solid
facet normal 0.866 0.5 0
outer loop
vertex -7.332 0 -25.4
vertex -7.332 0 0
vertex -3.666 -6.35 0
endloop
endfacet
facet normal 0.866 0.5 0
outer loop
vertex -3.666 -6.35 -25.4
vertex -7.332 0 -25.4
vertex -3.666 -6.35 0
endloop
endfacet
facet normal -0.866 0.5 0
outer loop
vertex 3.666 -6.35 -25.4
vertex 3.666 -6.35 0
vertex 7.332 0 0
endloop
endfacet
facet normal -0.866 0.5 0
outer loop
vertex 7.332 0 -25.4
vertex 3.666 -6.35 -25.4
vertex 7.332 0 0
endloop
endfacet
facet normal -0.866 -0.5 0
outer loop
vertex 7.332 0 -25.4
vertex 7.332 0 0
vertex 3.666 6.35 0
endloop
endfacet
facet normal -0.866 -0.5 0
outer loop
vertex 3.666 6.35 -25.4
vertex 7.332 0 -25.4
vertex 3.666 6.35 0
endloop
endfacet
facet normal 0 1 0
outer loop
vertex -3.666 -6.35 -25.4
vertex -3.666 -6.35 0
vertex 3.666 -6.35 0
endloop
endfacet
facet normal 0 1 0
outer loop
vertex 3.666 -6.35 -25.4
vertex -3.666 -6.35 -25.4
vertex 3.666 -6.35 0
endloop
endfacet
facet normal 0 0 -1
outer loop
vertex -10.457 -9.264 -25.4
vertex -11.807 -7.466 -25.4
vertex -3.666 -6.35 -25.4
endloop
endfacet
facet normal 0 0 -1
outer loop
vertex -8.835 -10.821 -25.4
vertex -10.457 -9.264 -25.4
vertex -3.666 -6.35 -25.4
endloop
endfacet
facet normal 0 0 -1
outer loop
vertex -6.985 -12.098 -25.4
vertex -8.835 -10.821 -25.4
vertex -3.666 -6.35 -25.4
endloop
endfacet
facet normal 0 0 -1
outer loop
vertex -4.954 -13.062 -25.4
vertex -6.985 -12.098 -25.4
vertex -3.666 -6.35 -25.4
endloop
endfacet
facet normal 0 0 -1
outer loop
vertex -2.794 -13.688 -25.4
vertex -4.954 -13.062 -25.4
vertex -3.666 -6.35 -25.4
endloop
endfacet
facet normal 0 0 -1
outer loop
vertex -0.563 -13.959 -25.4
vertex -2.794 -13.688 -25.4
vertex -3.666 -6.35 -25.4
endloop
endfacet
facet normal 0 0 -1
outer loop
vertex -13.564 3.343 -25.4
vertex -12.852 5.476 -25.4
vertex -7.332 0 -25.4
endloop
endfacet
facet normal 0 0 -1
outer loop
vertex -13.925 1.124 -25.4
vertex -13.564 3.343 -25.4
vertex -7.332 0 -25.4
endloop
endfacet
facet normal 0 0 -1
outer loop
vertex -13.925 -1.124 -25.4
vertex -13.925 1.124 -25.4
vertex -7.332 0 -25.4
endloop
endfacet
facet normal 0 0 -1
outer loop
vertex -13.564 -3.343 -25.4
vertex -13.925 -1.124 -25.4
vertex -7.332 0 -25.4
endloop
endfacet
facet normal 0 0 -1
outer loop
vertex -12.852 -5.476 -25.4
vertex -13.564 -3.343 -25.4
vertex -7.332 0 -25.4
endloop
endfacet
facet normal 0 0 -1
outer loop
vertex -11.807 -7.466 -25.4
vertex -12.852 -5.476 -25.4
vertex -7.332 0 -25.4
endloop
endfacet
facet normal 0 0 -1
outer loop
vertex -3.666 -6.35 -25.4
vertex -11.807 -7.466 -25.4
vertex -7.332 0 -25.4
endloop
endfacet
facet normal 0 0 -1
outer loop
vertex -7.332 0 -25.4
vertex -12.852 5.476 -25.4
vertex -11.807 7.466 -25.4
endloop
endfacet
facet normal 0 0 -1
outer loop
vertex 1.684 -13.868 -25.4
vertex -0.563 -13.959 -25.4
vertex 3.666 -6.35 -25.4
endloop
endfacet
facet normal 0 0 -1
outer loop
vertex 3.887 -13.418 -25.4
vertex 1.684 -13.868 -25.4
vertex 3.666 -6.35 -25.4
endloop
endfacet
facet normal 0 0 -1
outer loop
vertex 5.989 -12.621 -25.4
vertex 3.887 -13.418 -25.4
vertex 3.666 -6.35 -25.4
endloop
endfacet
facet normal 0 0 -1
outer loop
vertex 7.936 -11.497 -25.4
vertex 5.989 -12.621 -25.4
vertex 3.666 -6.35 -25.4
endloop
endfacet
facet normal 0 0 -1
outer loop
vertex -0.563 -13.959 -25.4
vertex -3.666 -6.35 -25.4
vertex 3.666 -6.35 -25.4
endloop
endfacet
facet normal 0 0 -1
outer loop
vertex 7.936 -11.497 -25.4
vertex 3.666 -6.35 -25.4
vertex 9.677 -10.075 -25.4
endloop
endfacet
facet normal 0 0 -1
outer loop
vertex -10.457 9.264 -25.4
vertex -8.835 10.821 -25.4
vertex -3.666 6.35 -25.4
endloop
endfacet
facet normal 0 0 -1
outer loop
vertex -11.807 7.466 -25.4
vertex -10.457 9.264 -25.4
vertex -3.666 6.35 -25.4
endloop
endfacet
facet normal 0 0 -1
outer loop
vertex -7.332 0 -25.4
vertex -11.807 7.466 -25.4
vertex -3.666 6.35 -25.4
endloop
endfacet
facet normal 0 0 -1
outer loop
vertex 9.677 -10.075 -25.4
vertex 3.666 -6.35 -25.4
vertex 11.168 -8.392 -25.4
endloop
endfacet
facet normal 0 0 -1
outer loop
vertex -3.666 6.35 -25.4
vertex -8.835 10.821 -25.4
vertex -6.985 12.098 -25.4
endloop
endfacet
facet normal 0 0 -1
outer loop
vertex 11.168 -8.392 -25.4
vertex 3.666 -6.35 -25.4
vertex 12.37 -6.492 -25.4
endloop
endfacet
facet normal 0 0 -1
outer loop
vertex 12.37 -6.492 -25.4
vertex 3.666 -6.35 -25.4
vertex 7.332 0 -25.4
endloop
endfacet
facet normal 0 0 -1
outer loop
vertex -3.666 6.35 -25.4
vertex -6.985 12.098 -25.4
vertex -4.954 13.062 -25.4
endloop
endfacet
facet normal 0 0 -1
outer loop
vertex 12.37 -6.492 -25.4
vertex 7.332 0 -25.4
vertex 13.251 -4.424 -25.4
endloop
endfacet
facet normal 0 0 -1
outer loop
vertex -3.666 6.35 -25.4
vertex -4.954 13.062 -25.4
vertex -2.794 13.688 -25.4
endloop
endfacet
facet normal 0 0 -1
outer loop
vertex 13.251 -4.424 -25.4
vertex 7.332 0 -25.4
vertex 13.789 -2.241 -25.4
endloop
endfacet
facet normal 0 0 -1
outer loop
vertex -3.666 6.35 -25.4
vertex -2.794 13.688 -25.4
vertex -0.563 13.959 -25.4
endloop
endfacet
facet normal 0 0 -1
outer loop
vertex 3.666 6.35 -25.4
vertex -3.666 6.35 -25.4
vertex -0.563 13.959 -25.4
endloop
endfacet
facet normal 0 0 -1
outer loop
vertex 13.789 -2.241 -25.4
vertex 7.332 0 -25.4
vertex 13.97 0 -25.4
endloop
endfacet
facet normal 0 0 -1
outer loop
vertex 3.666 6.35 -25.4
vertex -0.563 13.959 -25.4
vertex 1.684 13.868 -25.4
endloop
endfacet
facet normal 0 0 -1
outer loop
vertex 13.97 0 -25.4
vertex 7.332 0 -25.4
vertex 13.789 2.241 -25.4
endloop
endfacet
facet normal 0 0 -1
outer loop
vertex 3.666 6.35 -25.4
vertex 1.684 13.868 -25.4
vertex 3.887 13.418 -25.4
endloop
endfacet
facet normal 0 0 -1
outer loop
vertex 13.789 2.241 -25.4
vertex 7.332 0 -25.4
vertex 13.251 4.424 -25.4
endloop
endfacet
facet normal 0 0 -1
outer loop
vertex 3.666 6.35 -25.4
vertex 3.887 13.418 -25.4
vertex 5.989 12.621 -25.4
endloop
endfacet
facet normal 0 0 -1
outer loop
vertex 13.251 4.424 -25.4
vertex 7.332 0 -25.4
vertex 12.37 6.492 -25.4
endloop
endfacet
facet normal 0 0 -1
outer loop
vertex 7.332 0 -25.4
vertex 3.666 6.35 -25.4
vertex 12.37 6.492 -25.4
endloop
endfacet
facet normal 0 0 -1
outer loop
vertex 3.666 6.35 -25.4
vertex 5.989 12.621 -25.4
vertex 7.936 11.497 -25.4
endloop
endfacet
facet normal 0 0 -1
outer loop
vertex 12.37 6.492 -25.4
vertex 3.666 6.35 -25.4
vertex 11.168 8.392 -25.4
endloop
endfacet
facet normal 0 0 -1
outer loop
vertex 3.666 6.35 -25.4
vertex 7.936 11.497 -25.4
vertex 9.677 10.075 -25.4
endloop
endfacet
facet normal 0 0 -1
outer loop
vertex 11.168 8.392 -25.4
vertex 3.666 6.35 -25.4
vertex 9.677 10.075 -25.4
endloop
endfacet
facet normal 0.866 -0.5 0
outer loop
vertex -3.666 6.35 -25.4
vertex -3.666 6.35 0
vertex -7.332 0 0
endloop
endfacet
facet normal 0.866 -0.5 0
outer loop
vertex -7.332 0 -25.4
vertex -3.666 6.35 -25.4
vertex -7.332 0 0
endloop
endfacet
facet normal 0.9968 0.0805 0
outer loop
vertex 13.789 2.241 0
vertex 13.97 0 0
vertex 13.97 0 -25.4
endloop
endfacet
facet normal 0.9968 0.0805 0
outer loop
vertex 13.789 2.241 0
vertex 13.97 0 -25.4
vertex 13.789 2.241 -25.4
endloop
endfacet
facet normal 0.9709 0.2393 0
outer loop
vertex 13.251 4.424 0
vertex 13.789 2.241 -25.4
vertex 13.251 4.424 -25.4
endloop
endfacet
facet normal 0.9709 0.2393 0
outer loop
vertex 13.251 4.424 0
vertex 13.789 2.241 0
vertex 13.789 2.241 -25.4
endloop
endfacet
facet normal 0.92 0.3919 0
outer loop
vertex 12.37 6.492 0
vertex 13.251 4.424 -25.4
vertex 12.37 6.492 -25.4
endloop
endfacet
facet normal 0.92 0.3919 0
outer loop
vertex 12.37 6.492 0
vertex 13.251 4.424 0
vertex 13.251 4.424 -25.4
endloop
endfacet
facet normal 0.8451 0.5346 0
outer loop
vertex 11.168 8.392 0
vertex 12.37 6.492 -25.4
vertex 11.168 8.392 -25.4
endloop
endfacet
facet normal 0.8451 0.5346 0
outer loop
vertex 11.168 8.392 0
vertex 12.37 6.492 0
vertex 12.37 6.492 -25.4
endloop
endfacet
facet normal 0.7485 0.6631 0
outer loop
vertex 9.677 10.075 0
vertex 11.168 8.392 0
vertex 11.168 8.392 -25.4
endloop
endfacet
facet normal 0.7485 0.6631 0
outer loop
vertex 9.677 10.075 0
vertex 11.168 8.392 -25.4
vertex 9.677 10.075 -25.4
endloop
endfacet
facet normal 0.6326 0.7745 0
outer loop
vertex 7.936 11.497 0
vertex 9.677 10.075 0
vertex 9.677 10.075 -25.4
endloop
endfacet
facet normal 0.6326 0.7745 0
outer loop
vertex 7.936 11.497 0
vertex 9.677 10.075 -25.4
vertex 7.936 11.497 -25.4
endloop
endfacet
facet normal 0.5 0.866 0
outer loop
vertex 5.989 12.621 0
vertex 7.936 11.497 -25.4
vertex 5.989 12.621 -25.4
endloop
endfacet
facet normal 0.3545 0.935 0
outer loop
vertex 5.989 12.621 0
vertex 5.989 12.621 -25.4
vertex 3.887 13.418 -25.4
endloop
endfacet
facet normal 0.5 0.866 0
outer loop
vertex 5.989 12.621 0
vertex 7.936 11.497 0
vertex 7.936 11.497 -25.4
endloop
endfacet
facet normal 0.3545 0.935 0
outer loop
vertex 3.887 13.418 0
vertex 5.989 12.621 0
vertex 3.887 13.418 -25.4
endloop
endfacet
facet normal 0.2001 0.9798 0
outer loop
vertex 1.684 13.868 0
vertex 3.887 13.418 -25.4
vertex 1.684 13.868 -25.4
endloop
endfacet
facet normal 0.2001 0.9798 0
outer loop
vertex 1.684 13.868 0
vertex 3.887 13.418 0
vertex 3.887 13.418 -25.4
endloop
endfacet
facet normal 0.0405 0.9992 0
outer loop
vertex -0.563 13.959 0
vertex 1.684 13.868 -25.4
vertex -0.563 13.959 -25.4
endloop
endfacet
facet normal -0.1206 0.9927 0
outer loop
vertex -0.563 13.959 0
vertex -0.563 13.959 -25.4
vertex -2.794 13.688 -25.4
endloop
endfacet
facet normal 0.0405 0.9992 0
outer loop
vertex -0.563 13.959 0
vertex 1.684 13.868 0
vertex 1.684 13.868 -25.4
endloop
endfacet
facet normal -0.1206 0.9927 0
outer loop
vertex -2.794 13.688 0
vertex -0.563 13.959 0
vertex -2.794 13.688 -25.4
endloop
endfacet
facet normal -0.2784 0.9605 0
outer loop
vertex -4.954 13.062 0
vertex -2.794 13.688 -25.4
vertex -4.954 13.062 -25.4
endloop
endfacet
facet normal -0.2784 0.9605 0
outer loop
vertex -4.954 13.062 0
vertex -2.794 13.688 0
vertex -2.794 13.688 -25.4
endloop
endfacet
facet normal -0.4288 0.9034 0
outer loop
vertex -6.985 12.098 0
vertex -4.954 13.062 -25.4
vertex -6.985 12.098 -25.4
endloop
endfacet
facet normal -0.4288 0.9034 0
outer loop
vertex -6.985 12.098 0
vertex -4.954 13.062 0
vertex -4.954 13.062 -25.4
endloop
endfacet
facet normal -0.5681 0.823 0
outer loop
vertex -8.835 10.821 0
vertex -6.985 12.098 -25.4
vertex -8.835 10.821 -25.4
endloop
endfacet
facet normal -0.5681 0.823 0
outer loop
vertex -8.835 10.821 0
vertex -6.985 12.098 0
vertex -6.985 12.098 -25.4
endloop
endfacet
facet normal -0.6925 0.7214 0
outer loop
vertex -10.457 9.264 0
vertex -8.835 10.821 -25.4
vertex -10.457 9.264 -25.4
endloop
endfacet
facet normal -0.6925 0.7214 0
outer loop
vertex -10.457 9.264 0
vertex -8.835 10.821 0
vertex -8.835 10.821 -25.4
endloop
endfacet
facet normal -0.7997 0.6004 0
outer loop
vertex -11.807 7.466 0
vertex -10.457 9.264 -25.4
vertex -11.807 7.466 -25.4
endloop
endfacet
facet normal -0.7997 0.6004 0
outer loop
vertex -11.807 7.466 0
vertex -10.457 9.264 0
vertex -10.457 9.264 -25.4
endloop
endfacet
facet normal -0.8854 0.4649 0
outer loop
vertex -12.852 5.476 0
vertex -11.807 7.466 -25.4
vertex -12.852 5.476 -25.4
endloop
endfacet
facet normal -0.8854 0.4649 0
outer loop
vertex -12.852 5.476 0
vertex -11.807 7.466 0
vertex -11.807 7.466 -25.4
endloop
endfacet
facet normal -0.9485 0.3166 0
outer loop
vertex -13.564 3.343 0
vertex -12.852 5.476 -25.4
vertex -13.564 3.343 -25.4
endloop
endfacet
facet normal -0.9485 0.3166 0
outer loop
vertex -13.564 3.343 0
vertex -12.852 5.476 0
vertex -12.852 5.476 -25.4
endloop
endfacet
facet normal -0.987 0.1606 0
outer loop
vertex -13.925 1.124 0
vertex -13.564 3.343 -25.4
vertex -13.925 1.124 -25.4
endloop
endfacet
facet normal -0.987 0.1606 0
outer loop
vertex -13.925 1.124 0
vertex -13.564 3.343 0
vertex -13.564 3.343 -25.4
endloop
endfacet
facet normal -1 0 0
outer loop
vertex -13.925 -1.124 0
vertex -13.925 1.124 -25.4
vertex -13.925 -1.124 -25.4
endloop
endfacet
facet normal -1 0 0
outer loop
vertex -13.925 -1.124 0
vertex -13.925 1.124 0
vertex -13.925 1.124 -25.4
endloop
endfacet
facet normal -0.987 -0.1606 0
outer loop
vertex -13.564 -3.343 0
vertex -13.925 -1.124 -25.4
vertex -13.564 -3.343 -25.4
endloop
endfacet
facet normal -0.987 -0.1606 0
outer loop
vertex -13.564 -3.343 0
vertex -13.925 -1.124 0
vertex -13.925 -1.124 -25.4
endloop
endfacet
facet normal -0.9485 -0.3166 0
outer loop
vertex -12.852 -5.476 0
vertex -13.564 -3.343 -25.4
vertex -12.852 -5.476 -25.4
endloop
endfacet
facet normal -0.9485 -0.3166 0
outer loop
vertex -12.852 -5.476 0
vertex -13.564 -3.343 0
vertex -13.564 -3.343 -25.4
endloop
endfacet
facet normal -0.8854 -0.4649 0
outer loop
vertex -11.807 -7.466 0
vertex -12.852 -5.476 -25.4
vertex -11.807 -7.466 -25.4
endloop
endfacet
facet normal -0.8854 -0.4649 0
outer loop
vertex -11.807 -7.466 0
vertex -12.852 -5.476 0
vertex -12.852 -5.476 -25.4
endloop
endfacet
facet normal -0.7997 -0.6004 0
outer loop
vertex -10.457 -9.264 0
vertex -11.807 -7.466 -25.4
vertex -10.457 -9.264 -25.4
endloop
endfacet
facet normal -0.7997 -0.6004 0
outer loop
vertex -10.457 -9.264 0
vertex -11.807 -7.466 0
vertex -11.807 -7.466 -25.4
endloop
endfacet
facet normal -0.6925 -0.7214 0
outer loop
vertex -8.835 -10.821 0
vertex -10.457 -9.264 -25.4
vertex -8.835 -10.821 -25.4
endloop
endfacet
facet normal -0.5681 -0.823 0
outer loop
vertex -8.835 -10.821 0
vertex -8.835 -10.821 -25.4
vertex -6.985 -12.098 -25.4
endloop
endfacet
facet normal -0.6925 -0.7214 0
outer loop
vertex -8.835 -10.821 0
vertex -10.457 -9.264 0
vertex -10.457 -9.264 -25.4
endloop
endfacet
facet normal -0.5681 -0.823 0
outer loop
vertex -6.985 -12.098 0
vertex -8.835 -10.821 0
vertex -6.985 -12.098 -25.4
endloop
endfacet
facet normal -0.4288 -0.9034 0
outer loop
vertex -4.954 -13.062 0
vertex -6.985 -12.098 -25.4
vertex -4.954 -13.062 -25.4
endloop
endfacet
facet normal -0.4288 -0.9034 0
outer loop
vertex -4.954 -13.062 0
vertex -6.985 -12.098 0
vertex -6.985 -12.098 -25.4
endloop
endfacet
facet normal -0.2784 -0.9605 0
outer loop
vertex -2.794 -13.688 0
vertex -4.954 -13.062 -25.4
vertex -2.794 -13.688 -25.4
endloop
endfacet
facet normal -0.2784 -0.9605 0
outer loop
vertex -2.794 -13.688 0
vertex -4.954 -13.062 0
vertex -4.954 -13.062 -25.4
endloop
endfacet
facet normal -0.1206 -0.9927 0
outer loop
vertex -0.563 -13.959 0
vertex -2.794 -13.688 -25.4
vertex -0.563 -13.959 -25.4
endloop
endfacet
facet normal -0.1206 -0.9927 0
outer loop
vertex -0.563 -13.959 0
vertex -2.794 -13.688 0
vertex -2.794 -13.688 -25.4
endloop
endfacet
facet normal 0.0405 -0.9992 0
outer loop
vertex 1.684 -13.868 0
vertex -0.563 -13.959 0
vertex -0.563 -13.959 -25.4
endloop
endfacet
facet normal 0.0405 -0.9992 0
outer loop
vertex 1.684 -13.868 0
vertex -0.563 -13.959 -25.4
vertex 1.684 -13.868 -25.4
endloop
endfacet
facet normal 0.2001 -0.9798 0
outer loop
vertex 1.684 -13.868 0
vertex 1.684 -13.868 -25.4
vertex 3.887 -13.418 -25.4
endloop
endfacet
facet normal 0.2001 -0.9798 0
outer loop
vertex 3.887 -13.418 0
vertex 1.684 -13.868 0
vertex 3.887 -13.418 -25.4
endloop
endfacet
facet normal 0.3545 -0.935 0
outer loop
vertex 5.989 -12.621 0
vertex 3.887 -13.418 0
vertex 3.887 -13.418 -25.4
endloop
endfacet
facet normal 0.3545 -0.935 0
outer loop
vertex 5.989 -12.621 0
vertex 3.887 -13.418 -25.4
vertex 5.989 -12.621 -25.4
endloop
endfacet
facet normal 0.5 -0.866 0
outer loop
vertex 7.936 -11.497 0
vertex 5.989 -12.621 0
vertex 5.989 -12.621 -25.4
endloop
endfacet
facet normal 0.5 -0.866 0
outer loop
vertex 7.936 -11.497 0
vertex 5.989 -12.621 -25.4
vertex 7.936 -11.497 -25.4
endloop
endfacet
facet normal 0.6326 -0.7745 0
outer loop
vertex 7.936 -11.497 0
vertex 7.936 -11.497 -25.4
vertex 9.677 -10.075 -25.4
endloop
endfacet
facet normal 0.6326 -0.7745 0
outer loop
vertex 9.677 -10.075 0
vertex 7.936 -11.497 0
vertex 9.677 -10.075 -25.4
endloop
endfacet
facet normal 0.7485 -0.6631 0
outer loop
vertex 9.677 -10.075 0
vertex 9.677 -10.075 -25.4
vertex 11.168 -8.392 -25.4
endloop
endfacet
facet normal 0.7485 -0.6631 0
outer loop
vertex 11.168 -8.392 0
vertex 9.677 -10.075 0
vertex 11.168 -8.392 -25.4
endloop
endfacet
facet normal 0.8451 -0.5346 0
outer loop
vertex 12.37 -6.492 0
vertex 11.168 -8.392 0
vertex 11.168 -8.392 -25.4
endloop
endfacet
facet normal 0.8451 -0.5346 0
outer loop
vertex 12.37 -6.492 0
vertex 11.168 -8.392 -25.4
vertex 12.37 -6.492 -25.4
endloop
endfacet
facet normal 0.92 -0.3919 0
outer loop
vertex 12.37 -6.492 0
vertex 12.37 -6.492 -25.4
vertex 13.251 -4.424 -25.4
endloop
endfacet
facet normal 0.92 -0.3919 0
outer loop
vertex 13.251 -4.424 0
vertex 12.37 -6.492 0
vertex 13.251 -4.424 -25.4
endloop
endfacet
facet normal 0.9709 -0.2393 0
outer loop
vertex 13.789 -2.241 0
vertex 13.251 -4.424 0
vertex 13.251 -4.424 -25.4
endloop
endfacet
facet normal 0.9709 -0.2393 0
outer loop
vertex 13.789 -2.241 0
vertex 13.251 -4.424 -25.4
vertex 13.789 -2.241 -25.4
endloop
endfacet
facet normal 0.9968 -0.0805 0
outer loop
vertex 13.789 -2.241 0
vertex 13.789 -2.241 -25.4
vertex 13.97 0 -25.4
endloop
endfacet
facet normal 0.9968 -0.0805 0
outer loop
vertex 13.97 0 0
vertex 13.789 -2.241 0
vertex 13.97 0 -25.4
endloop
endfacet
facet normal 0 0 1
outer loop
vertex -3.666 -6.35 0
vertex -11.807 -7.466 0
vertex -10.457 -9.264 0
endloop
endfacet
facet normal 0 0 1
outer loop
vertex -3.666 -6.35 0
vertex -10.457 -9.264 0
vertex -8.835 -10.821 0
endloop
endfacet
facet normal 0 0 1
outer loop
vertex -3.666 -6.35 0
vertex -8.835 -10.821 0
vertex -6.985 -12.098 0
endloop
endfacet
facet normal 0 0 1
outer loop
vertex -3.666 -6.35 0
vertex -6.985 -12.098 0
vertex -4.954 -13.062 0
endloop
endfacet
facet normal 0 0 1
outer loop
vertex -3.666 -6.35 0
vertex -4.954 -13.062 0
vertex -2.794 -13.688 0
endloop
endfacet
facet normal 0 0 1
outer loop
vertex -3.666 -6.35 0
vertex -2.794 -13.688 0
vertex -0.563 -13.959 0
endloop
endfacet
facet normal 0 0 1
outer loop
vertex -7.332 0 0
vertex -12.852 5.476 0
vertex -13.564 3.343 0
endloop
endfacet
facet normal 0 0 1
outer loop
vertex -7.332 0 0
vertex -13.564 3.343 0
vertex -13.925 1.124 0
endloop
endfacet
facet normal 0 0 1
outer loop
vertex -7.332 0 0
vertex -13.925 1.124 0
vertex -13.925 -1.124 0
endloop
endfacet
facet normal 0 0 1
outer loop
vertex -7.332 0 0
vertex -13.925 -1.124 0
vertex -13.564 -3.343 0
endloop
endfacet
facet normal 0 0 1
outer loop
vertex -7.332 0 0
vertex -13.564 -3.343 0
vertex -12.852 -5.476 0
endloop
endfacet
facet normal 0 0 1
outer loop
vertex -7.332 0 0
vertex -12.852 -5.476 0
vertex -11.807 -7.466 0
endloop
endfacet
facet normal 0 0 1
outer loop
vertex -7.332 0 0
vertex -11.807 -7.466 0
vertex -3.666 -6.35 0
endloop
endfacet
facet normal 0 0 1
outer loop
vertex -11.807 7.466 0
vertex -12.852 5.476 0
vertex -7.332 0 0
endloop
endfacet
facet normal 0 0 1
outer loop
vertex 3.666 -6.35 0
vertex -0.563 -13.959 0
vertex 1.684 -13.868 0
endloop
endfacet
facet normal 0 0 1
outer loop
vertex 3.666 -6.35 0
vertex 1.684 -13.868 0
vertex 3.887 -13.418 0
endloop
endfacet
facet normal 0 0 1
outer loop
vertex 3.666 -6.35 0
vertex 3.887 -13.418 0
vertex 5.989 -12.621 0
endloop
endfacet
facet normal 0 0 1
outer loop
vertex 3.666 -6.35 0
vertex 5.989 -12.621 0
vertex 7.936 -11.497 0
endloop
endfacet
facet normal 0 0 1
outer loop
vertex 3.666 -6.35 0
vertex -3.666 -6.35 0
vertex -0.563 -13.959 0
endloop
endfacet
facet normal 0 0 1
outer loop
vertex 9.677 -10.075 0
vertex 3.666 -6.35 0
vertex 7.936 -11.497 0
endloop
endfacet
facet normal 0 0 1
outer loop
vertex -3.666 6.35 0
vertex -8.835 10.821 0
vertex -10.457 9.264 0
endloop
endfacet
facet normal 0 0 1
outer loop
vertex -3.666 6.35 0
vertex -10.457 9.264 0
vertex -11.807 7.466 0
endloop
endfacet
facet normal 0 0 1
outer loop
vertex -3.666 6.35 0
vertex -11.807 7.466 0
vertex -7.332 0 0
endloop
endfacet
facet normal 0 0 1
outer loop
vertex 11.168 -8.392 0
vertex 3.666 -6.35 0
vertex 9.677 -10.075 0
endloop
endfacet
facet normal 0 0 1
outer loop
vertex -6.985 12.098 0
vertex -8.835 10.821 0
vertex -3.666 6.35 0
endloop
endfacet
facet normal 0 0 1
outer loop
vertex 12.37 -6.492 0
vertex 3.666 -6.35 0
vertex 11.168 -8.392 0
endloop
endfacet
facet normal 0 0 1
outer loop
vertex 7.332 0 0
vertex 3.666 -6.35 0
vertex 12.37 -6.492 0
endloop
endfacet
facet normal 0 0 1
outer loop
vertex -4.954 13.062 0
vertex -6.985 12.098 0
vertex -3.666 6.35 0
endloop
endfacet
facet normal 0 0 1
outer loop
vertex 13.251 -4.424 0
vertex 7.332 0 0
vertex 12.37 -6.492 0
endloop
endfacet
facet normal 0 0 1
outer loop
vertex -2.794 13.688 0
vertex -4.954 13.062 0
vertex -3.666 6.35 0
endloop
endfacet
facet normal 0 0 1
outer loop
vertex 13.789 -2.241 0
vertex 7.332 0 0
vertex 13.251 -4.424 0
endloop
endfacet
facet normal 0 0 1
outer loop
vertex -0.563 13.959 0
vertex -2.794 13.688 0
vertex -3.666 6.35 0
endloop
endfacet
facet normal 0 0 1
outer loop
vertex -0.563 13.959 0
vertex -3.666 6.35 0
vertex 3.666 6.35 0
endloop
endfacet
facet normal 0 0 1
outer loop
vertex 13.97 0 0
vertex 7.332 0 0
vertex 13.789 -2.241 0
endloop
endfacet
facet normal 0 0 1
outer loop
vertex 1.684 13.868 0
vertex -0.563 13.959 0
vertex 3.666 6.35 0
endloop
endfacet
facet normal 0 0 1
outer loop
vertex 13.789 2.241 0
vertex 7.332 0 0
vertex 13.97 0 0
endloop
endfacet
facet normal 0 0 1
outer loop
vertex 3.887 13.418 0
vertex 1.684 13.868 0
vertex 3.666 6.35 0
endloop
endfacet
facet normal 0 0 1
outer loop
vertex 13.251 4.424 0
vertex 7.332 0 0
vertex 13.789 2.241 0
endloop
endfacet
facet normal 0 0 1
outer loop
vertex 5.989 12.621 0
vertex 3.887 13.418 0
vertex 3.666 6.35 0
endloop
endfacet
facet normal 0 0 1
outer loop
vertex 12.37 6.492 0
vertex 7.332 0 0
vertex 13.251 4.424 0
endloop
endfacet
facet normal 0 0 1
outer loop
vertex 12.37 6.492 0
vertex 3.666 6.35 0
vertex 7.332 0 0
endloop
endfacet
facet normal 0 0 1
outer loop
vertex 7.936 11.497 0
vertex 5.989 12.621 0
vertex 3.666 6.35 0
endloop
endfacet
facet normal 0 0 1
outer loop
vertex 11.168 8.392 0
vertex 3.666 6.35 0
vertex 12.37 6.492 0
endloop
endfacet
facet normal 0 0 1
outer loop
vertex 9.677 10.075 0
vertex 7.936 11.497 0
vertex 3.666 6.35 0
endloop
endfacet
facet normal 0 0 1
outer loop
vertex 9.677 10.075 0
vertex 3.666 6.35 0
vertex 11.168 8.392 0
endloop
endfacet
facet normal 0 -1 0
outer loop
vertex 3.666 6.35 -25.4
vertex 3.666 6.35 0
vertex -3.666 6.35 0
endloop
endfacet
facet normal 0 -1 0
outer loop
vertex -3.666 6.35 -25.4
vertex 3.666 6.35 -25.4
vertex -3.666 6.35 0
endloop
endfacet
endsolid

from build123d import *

# Parameters (mm, degrees)
SKETCH2_R           = 13.97
BOSS_EXTRUDE1_DEPTH = 25.4


with BuildPart() as part:
    # Sketch2 → Boss-Extrude1 (new body)
    with BuildSketch(Plane.XY):
        Circle(SKETCH2_R)
        Polygon((-3.666174209, 6.35), (-7.332348419, 0), (-3.666174209, -6.35), (3.666174209, -6.35), (7.332348419, 0), (3.666174209, 6.35), align=None, mode=Mode.SUBTRACT)
    extrude(amount=-BOSS_EXTRUDE1_DEPTH)


solid = part.part
